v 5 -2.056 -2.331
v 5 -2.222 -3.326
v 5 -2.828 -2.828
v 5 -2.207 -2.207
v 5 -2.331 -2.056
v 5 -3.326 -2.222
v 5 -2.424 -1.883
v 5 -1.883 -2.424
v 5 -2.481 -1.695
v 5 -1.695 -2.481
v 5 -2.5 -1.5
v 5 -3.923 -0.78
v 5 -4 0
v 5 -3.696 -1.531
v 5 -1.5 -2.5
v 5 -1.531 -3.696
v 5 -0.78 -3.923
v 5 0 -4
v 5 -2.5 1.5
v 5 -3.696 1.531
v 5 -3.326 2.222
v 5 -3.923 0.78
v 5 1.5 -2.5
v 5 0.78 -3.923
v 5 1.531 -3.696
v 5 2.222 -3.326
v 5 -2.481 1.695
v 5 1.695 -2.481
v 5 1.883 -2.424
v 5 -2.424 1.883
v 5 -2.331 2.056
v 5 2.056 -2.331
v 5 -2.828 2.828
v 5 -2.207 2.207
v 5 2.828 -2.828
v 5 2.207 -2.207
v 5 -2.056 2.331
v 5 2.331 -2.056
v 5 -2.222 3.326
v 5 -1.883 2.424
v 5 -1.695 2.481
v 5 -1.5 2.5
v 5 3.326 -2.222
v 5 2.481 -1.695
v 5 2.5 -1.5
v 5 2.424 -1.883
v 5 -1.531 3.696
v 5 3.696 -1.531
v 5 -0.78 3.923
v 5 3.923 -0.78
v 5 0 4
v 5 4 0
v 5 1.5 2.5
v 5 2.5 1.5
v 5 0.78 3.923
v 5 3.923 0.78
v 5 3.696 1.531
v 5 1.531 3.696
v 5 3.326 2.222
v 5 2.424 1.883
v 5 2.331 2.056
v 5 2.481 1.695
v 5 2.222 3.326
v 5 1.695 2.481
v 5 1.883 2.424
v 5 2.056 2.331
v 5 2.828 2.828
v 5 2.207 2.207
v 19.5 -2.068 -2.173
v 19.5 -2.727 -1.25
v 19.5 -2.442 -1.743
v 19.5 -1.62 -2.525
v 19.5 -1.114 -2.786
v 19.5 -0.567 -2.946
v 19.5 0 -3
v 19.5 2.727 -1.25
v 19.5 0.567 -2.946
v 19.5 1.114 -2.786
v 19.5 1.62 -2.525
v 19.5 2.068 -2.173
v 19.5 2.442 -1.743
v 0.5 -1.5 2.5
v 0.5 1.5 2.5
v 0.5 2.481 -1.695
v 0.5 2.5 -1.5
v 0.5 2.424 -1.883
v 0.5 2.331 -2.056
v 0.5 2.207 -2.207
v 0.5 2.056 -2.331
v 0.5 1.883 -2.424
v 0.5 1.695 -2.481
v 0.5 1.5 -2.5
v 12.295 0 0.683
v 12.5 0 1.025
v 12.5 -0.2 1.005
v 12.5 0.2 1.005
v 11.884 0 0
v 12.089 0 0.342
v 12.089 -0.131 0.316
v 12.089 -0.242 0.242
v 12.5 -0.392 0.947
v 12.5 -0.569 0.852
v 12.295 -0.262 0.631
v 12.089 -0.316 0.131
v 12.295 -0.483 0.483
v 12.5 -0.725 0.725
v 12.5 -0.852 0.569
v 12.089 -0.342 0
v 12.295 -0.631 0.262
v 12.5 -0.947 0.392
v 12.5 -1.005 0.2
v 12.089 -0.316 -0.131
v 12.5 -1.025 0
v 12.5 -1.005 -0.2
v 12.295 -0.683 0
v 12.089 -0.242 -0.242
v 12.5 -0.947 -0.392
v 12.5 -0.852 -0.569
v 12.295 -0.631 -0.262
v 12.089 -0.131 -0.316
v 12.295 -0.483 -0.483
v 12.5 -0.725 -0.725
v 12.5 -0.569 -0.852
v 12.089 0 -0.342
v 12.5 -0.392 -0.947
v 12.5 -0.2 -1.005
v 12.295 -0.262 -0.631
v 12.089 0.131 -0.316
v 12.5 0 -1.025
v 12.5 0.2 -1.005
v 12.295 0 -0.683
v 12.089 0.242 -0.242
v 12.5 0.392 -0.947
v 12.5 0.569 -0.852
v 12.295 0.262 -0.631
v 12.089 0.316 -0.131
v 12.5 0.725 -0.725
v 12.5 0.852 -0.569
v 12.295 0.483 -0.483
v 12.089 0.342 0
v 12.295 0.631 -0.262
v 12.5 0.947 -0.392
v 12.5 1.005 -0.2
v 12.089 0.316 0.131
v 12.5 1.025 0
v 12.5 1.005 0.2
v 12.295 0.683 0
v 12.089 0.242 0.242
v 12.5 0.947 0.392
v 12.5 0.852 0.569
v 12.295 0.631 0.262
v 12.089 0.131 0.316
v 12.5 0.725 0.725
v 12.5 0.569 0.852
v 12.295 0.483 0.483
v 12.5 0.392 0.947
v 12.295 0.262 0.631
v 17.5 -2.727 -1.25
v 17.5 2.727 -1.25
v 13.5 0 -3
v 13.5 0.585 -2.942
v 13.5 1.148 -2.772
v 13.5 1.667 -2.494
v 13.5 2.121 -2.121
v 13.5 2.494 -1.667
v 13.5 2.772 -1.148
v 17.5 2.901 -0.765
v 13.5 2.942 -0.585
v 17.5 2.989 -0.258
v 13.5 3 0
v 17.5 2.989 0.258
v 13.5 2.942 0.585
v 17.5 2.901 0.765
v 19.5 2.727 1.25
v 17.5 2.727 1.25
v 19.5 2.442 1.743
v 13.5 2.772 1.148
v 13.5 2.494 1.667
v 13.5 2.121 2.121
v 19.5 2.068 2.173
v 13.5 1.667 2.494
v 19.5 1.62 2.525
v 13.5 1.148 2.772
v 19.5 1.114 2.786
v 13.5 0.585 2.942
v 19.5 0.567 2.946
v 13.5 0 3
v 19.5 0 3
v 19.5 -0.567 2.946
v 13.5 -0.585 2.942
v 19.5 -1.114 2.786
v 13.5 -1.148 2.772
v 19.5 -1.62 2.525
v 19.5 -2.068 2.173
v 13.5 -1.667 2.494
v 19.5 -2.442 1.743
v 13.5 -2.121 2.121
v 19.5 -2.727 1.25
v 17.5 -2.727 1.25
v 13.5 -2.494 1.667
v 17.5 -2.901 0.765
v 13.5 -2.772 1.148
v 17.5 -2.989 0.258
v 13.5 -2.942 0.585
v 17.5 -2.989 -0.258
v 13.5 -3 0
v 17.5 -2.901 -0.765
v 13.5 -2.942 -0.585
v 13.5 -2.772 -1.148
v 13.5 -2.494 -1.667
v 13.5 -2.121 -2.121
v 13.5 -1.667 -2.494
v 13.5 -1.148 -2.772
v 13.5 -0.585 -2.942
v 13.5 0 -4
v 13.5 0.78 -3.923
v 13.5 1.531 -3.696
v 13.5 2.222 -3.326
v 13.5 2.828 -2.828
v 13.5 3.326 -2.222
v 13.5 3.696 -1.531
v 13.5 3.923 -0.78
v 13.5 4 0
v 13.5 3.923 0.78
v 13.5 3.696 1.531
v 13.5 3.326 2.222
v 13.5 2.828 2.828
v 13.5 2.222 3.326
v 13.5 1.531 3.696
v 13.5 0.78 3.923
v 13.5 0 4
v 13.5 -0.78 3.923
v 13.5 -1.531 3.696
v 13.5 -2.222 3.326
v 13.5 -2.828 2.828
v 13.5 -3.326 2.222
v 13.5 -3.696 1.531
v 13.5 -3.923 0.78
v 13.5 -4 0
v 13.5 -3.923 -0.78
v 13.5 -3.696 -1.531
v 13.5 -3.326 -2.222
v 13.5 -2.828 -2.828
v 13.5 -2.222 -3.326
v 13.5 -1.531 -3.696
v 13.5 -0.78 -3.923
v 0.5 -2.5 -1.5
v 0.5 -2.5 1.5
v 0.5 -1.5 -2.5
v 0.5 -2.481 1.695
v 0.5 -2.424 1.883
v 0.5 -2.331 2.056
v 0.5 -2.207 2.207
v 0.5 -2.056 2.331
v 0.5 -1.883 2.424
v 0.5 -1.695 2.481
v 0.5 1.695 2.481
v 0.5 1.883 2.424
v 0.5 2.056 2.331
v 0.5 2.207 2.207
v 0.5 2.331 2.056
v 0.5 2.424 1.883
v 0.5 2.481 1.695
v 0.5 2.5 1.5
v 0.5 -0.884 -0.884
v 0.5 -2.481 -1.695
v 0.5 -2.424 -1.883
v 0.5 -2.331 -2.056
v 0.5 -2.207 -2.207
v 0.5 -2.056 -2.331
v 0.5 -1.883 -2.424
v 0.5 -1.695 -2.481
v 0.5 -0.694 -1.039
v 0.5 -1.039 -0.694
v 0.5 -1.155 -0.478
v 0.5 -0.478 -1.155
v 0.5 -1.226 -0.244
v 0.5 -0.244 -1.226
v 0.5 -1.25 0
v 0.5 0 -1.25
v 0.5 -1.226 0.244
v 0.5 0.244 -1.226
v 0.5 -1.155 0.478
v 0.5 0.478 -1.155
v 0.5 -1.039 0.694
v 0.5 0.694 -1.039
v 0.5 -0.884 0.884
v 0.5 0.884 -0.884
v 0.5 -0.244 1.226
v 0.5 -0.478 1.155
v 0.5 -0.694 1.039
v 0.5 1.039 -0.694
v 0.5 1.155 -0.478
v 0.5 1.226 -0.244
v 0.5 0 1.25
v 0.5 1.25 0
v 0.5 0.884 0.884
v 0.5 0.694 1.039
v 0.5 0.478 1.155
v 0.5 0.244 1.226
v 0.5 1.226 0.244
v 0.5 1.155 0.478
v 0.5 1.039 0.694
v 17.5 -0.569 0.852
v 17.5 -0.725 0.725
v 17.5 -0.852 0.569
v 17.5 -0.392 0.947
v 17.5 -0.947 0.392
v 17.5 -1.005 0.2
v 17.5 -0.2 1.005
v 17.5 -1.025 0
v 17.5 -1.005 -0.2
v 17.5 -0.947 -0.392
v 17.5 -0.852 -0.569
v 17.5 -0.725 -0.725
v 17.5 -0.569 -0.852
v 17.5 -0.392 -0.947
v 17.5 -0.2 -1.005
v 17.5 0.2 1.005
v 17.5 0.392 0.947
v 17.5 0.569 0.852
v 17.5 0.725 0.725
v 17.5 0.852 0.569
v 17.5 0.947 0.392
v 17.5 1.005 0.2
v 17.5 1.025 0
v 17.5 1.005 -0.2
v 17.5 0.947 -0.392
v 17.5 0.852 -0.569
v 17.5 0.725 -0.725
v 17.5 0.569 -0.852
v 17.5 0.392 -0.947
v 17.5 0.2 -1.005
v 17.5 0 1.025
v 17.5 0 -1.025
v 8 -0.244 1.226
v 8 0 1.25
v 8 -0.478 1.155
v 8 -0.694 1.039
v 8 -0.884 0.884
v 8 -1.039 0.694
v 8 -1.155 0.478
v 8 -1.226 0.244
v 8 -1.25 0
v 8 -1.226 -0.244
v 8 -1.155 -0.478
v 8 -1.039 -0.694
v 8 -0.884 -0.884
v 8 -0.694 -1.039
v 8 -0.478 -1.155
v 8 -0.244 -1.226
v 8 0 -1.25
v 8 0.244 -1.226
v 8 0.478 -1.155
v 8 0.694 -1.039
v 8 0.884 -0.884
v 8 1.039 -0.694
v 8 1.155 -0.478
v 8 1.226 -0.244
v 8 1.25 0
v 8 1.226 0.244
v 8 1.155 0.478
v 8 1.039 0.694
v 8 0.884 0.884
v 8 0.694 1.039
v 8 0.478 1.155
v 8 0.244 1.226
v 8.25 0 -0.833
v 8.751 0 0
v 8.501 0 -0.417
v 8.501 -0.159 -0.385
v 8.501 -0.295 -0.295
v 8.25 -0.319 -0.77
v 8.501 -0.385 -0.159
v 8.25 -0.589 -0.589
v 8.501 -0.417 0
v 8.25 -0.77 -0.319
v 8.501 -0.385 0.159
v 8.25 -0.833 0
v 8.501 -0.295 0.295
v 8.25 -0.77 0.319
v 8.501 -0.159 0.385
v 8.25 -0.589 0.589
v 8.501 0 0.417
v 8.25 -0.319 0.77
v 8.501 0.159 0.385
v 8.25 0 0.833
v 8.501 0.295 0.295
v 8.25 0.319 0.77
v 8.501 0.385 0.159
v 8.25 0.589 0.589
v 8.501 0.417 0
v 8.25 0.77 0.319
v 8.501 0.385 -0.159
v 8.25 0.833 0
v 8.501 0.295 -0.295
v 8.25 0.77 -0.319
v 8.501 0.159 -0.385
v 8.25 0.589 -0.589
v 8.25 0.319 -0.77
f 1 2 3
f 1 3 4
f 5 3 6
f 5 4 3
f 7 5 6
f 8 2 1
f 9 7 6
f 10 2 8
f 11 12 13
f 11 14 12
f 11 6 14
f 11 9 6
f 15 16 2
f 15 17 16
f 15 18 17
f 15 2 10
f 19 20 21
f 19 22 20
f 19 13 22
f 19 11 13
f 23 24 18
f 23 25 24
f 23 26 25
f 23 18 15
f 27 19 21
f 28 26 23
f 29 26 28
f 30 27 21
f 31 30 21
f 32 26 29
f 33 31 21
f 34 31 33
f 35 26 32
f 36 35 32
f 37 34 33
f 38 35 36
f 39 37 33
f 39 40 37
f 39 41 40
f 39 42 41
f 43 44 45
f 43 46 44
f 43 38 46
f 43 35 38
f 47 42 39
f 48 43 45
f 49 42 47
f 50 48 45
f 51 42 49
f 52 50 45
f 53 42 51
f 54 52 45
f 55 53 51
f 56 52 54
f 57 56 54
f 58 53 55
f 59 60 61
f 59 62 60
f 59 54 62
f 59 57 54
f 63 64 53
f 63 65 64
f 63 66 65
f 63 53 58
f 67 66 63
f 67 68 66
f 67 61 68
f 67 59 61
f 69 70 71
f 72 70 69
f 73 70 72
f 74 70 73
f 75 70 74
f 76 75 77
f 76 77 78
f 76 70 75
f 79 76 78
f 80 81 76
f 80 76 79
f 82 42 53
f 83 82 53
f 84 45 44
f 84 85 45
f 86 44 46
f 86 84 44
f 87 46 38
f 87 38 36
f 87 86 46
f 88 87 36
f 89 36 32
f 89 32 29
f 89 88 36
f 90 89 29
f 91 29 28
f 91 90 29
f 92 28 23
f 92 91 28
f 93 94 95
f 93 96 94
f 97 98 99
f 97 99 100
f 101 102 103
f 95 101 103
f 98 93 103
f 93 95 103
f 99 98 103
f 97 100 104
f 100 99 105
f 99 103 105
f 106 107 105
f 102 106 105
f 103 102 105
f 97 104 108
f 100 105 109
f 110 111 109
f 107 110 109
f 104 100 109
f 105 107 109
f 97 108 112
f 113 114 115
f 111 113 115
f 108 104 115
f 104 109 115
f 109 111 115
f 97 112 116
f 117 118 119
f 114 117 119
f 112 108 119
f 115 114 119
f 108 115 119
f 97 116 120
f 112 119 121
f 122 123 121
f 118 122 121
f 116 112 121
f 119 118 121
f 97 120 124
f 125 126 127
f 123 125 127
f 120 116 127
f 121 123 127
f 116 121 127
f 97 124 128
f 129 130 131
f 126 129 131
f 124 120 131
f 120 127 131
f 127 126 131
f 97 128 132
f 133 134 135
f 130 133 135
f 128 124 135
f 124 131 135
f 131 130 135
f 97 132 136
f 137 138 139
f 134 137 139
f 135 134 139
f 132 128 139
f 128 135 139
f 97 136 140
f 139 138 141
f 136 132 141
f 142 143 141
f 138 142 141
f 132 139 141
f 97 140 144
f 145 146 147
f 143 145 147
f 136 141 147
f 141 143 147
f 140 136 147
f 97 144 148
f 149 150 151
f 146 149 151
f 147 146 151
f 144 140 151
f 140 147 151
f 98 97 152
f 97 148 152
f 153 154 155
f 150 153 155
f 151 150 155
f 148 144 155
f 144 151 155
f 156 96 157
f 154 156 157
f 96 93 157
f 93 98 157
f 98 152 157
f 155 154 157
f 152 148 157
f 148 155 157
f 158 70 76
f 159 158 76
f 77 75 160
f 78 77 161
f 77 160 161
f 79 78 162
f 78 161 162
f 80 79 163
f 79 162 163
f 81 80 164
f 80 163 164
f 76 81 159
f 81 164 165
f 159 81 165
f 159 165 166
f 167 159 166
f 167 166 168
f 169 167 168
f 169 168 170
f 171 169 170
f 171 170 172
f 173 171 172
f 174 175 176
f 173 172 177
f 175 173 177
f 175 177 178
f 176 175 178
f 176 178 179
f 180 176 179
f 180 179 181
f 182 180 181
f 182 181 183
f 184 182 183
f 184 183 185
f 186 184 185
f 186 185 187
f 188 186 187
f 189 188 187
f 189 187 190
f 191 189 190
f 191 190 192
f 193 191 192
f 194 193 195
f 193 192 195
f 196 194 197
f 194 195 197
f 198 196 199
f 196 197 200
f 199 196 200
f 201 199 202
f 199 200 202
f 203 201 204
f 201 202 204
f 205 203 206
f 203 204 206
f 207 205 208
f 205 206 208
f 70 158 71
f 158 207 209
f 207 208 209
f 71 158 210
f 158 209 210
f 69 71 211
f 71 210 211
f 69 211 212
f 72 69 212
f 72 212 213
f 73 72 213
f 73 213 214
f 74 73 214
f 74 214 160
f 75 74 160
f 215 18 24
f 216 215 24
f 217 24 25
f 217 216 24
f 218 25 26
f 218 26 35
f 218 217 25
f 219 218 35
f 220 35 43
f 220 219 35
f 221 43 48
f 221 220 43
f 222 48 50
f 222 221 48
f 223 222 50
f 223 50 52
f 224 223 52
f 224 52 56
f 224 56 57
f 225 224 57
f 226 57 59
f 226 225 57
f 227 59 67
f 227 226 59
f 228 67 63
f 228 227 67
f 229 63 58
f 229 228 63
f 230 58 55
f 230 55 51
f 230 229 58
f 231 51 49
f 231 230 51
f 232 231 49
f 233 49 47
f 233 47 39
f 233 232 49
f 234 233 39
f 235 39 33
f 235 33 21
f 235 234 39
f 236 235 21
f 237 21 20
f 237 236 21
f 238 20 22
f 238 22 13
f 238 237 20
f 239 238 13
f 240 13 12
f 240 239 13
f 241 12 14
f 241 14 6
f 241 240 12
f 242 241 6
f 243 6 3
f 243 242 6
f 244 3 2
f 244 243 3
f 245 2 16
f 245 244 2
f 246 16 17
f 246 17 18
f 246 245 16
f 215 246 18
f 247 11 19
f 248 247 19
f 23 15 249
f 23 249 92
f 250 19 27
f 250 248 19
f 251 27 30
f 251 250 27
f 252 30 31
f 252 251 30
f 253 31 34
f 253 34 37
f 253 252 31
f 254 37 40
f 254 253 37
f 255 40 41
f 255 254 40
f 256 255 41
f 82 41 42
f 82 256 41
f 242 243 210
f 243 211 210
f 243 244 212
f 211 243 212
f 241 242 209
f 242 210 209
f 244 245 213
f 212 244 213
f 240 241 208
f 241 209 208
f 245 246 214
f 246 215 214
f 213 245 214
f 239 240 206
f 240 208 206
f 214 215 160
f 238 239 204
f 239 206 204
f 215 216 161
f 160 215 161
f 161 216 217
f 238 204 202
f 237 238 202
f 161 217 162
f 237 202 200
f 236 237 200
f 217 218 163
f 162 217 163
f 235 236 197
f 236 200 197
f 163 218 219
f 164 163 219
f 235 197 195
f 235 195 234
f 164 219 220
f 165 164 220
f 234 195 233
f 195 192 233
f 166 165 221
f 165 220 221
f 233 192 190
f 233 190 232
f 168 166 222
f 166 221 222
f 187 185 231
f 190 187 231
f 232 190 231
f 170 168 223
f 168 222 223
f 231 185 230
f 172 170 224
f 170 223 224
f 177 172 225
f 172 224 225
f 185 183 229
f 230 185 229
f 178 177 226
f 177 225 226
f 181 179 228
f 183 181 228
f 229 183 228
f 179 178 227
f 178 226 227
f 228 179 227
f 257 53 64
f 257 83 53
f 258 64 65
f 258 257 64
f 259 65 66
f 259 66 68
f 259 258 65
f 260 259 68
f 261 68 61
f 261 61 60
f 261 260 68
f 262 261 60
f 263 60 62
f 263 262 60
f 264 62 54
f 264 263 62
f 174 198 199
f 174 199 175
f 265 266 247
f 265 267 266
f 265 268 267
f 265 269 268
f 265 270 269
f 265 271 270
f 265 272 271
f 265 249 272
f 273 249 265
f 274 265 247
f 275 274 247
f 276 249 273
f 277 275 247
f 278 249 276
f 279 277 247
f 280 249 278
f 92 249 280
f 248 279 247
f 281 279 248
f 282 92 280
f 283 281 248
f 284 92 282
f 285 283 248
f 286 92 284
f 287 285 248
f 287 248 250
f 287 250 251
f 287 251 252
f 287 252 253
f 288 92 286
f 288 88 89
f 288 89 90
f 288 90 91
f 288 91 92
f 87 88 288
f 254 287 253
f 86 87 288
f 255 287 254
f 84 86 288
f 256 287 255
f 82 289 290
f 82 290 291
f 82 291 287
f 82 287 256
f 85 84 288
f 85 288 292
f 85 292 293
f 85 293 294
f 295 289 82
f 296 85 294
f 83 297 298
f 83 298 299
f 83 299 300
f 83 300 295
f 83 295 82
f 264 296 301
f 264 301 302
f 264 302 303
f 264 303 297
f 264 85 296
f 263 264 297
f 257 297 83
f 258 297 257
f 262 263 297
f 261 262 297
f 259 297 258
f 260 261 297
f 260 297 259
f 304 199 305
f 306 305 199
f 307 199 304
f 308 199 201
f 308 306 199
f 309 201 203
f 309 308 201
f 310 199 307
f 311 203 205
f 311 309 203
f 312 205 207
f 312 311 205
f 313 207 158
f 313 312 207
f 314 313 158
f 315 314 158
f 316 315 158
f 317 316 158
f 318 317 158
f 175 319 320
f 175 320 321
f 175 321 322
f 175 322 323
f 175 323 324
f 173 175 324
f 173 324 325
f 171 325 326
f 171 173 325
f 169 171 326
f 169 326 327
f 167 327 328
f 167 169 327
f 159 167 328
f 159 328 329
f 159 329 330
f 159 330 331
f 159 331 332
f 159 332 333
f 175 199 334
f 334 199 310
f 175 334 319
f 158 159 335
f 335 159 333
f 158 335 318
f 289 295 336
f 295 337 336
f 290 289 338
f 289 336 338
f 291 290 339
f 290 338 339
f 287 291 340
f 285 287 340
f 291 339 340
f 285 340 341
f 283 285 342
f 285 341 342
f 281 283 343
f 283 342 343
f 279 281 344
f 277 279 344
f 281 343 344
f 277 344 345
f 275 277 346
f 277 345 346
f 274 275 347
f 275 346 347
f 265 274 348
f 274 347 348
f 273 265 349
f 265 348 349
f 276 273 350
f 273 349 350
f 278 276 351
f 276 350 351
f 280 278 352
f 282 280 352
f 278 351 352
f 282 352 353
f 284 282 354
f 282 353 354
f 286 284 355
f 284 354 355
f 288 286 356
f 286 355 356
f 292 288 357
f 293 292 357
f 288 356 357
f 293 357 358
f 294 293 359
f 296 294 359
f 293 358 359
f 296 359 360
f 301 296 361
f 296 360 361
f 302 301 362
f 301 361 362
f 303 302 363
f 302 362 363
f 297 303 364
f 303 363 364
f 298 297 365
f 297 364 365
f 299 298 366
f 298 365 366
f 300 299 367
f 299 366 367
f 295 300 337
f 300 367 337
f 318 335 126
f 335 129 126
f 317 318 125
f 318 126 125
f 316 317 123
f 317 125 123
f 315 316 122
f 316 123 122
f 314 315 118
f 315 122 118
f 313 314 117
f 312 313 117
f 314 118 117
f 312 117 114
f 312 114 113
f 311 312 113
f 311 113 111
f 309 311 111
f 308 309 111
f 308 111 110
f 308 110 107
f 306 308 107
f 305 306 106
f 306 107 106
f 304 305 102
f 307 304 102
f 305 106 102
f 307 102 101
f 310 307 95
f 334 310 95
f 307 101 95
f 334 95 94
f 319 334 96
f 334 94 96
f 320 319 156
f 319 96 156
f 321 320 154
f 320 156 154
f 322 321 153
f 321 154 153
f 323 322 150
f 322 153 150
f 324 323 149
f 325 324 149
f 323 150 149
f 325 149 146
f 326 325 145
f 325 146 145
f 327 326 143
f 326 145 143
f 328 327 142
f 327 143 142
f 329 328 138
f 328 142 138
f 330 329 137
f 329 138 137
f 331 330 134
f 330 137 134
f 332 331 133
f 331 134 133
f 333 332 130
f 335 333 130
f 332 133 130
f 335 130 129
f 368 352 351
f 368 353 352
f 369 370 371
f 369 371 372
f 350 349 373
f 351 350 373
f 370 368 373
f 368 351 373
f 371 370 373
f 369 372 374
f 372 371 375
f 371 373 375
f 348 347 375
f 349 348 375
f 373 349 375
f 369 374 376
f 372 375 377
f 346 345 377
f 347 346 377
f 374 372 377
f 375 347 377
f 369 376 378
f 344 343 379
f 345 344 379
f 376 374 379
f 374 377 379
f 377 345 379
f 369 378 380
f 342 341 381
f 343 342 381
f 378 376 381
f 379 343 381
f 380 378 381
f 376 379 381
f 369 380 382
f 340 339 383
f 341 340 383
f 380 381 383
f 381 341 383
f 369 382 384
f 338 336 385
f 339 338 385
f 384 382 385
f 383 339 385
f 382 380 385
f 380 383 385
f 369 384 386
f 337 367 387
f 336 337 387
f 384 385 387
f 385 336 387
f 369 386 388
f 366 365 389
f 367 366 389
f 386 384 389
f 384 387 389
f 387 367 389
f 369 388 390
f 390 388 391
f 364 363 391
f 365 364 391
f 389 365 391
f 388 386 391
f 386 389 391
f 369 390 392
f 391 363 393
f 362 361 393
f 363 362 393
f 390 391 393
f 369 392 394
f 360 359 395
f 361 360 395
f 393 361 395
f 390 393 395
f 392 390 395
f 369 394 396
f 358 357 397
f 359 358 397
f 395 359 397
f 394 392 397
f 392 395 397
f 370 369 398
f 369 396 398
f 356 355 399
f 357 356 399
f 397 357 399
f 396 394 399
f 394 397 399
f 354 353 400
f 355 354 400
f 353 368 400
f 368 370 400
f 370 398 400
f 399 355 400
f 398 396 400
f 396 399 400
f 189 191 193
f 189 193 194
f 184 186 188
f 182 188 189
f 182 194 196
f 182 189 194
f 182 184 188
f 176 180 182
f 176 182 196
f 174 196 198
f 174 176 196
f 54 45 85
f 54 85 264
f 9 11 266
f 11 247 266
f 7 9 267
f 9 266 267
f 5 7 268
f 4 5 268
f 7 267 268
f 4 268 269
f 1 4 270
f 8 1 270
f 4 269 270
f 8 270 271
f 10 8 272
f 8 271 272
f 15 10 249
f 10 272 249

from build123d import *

# Parameters (mm, degrees)
SKETCH1_W                    = 8.5
SKETCH1_H                    = 4
SKETCH2_W                    = 5
SKETCH2_H                    = 5
BOSS_EXTRUDE1_DEPTH          = 4.5
SKETCH3_R                    = 3
BOSS_EXTRUDE2_DEPTH          = 6
SKETCH8_W                    = 2.5
SKETCH8_H                    = 6.839743052
CUT_EXTRUDE2_DEPTH           = 2
FILLET1_R                    = 1
M3X0_5_TAPPED_HOLE1_D        = 2.5
M3X0_5_TAPPED_HOLE1_DEPTH    = 7.5
M3X0_5_TAPPED_HOLE1_TIP      = 0.751075774
M2_5X0_45_TAPPED_HOLE2_D     = 2.05
M2_5X0_45_TAPPED_HOLE2_DEPTH = 5
M2_5X0_45_TAPPED_HOLE2_TIP   = 0.615882135


with BuildPart() as part:
    # Sketch1 → Revolve1 (revolve)
    with BuildSketch(Plane.XY, mode=Mode.PRIVATE) as revolve1_sk:
        with Locations((9.25, 2)):
            Rectangle(SKETCH1_W, SKETCH1_H)
    revolve(revolve1_sk.sketch.rotate(Axis((5, 0, 0), (1, 0, 0)), 270), axis=Axis((5, 0, 0), (1, 0, 0)))

    # Sketch2 → Boss-Extrude1 (add)
    with BuildSketch(Plane.ZY.offset(-5)):
        Rectangle(SKETCH2_W, SKETCH2_H)
    extrude(amount=BOSS_EXTRUDE1_DEPTH)

    # Sketch3 → Boss-Extrude2 (add)
    with BuildSketch(Plane(origin=(13.5, 0, 0), x_dir=(0, 0, -1), z_dir=(1, 0, 0))):
        Circle(SKETCH3_R)
    extrude(amount=BOSS_EXTRUDE2_DEPTH)

    # Sketch8 → Cut-Extrude2 (cut)
    with BuildSketch(Plane(origin=(19.5, 0, 0), x_dir=(0, 0, -1), z_dir=(1, 0, 0))):
        Rectangle(SKETCH8_W, SKETCH8_H)
    extrude(amount=-CUT_EXTRUDE2_DEPTH, mode=Mode.SUBTRACT)

    # Fillet1
    fillet1_edges = [part.edges().sort_by_distance(p)[0] for p in [
        (2.75, -2.5, 2.5),
        (2.75, 2.5, 2.5),
        (2.75, 2.5, -2.5),
        (2.75, -2.5, -2.5),
    ]]
    fillet(fillet1_edges, radius=FILLET1_R)

    # M3x0.5 Tapped Hole1
    with Locations(Plane(origin=(0.5, 0, 0), x_dir=(0, 0, -1), z_dir=(-1, 0, 0))):
        with Locations((0, 0)):
            Hole(M3X0_5_TAPPED_HOLE1_D / 2, depth=M3X0_5_TAPPED_HOLE1_DEPTH)
            with Locations((0, 0, -(M3X0_5_TAPPED_HOLE1_DEPTH + M3X0_5_TAPPED_HOLE1_TIP / 2))):  # 118° drill point
                Cone(0, M3X0_5_TAPPED_HOLE1_D / 2, M3X0_5_TAPPED_HOLE1_TIP, mode=Mode.SUBTRACT)

    # M2.5x0.45 Tapped Hole2
    with Locations(Plane(origin=(17.5, 0, 0), x_dir=(0, 0, 1), z_dir=(1, 0, 0))):
        with Locations((0, 0)):
            Hole(M2_5X0_45_TAPPED_HOLE2_D / 2, depth=M2_5X0_45_TAPPED_HOLE2_DEPTH)
            with Locations((0, 0, -(M2_5X0_45_TAPPED_HOLE2_DEPTH + M2_5X0_45_TAPPED_HOLE2_TIP / 2))):  # 118° drill point
                Cone(0, M2_5X0_45_TAPPED_HOLE2_D / 2, M2_5X0_45_TAPPED_HOLE2_TIP, mode=Mode.SUBTRACT)


solid = part.part
